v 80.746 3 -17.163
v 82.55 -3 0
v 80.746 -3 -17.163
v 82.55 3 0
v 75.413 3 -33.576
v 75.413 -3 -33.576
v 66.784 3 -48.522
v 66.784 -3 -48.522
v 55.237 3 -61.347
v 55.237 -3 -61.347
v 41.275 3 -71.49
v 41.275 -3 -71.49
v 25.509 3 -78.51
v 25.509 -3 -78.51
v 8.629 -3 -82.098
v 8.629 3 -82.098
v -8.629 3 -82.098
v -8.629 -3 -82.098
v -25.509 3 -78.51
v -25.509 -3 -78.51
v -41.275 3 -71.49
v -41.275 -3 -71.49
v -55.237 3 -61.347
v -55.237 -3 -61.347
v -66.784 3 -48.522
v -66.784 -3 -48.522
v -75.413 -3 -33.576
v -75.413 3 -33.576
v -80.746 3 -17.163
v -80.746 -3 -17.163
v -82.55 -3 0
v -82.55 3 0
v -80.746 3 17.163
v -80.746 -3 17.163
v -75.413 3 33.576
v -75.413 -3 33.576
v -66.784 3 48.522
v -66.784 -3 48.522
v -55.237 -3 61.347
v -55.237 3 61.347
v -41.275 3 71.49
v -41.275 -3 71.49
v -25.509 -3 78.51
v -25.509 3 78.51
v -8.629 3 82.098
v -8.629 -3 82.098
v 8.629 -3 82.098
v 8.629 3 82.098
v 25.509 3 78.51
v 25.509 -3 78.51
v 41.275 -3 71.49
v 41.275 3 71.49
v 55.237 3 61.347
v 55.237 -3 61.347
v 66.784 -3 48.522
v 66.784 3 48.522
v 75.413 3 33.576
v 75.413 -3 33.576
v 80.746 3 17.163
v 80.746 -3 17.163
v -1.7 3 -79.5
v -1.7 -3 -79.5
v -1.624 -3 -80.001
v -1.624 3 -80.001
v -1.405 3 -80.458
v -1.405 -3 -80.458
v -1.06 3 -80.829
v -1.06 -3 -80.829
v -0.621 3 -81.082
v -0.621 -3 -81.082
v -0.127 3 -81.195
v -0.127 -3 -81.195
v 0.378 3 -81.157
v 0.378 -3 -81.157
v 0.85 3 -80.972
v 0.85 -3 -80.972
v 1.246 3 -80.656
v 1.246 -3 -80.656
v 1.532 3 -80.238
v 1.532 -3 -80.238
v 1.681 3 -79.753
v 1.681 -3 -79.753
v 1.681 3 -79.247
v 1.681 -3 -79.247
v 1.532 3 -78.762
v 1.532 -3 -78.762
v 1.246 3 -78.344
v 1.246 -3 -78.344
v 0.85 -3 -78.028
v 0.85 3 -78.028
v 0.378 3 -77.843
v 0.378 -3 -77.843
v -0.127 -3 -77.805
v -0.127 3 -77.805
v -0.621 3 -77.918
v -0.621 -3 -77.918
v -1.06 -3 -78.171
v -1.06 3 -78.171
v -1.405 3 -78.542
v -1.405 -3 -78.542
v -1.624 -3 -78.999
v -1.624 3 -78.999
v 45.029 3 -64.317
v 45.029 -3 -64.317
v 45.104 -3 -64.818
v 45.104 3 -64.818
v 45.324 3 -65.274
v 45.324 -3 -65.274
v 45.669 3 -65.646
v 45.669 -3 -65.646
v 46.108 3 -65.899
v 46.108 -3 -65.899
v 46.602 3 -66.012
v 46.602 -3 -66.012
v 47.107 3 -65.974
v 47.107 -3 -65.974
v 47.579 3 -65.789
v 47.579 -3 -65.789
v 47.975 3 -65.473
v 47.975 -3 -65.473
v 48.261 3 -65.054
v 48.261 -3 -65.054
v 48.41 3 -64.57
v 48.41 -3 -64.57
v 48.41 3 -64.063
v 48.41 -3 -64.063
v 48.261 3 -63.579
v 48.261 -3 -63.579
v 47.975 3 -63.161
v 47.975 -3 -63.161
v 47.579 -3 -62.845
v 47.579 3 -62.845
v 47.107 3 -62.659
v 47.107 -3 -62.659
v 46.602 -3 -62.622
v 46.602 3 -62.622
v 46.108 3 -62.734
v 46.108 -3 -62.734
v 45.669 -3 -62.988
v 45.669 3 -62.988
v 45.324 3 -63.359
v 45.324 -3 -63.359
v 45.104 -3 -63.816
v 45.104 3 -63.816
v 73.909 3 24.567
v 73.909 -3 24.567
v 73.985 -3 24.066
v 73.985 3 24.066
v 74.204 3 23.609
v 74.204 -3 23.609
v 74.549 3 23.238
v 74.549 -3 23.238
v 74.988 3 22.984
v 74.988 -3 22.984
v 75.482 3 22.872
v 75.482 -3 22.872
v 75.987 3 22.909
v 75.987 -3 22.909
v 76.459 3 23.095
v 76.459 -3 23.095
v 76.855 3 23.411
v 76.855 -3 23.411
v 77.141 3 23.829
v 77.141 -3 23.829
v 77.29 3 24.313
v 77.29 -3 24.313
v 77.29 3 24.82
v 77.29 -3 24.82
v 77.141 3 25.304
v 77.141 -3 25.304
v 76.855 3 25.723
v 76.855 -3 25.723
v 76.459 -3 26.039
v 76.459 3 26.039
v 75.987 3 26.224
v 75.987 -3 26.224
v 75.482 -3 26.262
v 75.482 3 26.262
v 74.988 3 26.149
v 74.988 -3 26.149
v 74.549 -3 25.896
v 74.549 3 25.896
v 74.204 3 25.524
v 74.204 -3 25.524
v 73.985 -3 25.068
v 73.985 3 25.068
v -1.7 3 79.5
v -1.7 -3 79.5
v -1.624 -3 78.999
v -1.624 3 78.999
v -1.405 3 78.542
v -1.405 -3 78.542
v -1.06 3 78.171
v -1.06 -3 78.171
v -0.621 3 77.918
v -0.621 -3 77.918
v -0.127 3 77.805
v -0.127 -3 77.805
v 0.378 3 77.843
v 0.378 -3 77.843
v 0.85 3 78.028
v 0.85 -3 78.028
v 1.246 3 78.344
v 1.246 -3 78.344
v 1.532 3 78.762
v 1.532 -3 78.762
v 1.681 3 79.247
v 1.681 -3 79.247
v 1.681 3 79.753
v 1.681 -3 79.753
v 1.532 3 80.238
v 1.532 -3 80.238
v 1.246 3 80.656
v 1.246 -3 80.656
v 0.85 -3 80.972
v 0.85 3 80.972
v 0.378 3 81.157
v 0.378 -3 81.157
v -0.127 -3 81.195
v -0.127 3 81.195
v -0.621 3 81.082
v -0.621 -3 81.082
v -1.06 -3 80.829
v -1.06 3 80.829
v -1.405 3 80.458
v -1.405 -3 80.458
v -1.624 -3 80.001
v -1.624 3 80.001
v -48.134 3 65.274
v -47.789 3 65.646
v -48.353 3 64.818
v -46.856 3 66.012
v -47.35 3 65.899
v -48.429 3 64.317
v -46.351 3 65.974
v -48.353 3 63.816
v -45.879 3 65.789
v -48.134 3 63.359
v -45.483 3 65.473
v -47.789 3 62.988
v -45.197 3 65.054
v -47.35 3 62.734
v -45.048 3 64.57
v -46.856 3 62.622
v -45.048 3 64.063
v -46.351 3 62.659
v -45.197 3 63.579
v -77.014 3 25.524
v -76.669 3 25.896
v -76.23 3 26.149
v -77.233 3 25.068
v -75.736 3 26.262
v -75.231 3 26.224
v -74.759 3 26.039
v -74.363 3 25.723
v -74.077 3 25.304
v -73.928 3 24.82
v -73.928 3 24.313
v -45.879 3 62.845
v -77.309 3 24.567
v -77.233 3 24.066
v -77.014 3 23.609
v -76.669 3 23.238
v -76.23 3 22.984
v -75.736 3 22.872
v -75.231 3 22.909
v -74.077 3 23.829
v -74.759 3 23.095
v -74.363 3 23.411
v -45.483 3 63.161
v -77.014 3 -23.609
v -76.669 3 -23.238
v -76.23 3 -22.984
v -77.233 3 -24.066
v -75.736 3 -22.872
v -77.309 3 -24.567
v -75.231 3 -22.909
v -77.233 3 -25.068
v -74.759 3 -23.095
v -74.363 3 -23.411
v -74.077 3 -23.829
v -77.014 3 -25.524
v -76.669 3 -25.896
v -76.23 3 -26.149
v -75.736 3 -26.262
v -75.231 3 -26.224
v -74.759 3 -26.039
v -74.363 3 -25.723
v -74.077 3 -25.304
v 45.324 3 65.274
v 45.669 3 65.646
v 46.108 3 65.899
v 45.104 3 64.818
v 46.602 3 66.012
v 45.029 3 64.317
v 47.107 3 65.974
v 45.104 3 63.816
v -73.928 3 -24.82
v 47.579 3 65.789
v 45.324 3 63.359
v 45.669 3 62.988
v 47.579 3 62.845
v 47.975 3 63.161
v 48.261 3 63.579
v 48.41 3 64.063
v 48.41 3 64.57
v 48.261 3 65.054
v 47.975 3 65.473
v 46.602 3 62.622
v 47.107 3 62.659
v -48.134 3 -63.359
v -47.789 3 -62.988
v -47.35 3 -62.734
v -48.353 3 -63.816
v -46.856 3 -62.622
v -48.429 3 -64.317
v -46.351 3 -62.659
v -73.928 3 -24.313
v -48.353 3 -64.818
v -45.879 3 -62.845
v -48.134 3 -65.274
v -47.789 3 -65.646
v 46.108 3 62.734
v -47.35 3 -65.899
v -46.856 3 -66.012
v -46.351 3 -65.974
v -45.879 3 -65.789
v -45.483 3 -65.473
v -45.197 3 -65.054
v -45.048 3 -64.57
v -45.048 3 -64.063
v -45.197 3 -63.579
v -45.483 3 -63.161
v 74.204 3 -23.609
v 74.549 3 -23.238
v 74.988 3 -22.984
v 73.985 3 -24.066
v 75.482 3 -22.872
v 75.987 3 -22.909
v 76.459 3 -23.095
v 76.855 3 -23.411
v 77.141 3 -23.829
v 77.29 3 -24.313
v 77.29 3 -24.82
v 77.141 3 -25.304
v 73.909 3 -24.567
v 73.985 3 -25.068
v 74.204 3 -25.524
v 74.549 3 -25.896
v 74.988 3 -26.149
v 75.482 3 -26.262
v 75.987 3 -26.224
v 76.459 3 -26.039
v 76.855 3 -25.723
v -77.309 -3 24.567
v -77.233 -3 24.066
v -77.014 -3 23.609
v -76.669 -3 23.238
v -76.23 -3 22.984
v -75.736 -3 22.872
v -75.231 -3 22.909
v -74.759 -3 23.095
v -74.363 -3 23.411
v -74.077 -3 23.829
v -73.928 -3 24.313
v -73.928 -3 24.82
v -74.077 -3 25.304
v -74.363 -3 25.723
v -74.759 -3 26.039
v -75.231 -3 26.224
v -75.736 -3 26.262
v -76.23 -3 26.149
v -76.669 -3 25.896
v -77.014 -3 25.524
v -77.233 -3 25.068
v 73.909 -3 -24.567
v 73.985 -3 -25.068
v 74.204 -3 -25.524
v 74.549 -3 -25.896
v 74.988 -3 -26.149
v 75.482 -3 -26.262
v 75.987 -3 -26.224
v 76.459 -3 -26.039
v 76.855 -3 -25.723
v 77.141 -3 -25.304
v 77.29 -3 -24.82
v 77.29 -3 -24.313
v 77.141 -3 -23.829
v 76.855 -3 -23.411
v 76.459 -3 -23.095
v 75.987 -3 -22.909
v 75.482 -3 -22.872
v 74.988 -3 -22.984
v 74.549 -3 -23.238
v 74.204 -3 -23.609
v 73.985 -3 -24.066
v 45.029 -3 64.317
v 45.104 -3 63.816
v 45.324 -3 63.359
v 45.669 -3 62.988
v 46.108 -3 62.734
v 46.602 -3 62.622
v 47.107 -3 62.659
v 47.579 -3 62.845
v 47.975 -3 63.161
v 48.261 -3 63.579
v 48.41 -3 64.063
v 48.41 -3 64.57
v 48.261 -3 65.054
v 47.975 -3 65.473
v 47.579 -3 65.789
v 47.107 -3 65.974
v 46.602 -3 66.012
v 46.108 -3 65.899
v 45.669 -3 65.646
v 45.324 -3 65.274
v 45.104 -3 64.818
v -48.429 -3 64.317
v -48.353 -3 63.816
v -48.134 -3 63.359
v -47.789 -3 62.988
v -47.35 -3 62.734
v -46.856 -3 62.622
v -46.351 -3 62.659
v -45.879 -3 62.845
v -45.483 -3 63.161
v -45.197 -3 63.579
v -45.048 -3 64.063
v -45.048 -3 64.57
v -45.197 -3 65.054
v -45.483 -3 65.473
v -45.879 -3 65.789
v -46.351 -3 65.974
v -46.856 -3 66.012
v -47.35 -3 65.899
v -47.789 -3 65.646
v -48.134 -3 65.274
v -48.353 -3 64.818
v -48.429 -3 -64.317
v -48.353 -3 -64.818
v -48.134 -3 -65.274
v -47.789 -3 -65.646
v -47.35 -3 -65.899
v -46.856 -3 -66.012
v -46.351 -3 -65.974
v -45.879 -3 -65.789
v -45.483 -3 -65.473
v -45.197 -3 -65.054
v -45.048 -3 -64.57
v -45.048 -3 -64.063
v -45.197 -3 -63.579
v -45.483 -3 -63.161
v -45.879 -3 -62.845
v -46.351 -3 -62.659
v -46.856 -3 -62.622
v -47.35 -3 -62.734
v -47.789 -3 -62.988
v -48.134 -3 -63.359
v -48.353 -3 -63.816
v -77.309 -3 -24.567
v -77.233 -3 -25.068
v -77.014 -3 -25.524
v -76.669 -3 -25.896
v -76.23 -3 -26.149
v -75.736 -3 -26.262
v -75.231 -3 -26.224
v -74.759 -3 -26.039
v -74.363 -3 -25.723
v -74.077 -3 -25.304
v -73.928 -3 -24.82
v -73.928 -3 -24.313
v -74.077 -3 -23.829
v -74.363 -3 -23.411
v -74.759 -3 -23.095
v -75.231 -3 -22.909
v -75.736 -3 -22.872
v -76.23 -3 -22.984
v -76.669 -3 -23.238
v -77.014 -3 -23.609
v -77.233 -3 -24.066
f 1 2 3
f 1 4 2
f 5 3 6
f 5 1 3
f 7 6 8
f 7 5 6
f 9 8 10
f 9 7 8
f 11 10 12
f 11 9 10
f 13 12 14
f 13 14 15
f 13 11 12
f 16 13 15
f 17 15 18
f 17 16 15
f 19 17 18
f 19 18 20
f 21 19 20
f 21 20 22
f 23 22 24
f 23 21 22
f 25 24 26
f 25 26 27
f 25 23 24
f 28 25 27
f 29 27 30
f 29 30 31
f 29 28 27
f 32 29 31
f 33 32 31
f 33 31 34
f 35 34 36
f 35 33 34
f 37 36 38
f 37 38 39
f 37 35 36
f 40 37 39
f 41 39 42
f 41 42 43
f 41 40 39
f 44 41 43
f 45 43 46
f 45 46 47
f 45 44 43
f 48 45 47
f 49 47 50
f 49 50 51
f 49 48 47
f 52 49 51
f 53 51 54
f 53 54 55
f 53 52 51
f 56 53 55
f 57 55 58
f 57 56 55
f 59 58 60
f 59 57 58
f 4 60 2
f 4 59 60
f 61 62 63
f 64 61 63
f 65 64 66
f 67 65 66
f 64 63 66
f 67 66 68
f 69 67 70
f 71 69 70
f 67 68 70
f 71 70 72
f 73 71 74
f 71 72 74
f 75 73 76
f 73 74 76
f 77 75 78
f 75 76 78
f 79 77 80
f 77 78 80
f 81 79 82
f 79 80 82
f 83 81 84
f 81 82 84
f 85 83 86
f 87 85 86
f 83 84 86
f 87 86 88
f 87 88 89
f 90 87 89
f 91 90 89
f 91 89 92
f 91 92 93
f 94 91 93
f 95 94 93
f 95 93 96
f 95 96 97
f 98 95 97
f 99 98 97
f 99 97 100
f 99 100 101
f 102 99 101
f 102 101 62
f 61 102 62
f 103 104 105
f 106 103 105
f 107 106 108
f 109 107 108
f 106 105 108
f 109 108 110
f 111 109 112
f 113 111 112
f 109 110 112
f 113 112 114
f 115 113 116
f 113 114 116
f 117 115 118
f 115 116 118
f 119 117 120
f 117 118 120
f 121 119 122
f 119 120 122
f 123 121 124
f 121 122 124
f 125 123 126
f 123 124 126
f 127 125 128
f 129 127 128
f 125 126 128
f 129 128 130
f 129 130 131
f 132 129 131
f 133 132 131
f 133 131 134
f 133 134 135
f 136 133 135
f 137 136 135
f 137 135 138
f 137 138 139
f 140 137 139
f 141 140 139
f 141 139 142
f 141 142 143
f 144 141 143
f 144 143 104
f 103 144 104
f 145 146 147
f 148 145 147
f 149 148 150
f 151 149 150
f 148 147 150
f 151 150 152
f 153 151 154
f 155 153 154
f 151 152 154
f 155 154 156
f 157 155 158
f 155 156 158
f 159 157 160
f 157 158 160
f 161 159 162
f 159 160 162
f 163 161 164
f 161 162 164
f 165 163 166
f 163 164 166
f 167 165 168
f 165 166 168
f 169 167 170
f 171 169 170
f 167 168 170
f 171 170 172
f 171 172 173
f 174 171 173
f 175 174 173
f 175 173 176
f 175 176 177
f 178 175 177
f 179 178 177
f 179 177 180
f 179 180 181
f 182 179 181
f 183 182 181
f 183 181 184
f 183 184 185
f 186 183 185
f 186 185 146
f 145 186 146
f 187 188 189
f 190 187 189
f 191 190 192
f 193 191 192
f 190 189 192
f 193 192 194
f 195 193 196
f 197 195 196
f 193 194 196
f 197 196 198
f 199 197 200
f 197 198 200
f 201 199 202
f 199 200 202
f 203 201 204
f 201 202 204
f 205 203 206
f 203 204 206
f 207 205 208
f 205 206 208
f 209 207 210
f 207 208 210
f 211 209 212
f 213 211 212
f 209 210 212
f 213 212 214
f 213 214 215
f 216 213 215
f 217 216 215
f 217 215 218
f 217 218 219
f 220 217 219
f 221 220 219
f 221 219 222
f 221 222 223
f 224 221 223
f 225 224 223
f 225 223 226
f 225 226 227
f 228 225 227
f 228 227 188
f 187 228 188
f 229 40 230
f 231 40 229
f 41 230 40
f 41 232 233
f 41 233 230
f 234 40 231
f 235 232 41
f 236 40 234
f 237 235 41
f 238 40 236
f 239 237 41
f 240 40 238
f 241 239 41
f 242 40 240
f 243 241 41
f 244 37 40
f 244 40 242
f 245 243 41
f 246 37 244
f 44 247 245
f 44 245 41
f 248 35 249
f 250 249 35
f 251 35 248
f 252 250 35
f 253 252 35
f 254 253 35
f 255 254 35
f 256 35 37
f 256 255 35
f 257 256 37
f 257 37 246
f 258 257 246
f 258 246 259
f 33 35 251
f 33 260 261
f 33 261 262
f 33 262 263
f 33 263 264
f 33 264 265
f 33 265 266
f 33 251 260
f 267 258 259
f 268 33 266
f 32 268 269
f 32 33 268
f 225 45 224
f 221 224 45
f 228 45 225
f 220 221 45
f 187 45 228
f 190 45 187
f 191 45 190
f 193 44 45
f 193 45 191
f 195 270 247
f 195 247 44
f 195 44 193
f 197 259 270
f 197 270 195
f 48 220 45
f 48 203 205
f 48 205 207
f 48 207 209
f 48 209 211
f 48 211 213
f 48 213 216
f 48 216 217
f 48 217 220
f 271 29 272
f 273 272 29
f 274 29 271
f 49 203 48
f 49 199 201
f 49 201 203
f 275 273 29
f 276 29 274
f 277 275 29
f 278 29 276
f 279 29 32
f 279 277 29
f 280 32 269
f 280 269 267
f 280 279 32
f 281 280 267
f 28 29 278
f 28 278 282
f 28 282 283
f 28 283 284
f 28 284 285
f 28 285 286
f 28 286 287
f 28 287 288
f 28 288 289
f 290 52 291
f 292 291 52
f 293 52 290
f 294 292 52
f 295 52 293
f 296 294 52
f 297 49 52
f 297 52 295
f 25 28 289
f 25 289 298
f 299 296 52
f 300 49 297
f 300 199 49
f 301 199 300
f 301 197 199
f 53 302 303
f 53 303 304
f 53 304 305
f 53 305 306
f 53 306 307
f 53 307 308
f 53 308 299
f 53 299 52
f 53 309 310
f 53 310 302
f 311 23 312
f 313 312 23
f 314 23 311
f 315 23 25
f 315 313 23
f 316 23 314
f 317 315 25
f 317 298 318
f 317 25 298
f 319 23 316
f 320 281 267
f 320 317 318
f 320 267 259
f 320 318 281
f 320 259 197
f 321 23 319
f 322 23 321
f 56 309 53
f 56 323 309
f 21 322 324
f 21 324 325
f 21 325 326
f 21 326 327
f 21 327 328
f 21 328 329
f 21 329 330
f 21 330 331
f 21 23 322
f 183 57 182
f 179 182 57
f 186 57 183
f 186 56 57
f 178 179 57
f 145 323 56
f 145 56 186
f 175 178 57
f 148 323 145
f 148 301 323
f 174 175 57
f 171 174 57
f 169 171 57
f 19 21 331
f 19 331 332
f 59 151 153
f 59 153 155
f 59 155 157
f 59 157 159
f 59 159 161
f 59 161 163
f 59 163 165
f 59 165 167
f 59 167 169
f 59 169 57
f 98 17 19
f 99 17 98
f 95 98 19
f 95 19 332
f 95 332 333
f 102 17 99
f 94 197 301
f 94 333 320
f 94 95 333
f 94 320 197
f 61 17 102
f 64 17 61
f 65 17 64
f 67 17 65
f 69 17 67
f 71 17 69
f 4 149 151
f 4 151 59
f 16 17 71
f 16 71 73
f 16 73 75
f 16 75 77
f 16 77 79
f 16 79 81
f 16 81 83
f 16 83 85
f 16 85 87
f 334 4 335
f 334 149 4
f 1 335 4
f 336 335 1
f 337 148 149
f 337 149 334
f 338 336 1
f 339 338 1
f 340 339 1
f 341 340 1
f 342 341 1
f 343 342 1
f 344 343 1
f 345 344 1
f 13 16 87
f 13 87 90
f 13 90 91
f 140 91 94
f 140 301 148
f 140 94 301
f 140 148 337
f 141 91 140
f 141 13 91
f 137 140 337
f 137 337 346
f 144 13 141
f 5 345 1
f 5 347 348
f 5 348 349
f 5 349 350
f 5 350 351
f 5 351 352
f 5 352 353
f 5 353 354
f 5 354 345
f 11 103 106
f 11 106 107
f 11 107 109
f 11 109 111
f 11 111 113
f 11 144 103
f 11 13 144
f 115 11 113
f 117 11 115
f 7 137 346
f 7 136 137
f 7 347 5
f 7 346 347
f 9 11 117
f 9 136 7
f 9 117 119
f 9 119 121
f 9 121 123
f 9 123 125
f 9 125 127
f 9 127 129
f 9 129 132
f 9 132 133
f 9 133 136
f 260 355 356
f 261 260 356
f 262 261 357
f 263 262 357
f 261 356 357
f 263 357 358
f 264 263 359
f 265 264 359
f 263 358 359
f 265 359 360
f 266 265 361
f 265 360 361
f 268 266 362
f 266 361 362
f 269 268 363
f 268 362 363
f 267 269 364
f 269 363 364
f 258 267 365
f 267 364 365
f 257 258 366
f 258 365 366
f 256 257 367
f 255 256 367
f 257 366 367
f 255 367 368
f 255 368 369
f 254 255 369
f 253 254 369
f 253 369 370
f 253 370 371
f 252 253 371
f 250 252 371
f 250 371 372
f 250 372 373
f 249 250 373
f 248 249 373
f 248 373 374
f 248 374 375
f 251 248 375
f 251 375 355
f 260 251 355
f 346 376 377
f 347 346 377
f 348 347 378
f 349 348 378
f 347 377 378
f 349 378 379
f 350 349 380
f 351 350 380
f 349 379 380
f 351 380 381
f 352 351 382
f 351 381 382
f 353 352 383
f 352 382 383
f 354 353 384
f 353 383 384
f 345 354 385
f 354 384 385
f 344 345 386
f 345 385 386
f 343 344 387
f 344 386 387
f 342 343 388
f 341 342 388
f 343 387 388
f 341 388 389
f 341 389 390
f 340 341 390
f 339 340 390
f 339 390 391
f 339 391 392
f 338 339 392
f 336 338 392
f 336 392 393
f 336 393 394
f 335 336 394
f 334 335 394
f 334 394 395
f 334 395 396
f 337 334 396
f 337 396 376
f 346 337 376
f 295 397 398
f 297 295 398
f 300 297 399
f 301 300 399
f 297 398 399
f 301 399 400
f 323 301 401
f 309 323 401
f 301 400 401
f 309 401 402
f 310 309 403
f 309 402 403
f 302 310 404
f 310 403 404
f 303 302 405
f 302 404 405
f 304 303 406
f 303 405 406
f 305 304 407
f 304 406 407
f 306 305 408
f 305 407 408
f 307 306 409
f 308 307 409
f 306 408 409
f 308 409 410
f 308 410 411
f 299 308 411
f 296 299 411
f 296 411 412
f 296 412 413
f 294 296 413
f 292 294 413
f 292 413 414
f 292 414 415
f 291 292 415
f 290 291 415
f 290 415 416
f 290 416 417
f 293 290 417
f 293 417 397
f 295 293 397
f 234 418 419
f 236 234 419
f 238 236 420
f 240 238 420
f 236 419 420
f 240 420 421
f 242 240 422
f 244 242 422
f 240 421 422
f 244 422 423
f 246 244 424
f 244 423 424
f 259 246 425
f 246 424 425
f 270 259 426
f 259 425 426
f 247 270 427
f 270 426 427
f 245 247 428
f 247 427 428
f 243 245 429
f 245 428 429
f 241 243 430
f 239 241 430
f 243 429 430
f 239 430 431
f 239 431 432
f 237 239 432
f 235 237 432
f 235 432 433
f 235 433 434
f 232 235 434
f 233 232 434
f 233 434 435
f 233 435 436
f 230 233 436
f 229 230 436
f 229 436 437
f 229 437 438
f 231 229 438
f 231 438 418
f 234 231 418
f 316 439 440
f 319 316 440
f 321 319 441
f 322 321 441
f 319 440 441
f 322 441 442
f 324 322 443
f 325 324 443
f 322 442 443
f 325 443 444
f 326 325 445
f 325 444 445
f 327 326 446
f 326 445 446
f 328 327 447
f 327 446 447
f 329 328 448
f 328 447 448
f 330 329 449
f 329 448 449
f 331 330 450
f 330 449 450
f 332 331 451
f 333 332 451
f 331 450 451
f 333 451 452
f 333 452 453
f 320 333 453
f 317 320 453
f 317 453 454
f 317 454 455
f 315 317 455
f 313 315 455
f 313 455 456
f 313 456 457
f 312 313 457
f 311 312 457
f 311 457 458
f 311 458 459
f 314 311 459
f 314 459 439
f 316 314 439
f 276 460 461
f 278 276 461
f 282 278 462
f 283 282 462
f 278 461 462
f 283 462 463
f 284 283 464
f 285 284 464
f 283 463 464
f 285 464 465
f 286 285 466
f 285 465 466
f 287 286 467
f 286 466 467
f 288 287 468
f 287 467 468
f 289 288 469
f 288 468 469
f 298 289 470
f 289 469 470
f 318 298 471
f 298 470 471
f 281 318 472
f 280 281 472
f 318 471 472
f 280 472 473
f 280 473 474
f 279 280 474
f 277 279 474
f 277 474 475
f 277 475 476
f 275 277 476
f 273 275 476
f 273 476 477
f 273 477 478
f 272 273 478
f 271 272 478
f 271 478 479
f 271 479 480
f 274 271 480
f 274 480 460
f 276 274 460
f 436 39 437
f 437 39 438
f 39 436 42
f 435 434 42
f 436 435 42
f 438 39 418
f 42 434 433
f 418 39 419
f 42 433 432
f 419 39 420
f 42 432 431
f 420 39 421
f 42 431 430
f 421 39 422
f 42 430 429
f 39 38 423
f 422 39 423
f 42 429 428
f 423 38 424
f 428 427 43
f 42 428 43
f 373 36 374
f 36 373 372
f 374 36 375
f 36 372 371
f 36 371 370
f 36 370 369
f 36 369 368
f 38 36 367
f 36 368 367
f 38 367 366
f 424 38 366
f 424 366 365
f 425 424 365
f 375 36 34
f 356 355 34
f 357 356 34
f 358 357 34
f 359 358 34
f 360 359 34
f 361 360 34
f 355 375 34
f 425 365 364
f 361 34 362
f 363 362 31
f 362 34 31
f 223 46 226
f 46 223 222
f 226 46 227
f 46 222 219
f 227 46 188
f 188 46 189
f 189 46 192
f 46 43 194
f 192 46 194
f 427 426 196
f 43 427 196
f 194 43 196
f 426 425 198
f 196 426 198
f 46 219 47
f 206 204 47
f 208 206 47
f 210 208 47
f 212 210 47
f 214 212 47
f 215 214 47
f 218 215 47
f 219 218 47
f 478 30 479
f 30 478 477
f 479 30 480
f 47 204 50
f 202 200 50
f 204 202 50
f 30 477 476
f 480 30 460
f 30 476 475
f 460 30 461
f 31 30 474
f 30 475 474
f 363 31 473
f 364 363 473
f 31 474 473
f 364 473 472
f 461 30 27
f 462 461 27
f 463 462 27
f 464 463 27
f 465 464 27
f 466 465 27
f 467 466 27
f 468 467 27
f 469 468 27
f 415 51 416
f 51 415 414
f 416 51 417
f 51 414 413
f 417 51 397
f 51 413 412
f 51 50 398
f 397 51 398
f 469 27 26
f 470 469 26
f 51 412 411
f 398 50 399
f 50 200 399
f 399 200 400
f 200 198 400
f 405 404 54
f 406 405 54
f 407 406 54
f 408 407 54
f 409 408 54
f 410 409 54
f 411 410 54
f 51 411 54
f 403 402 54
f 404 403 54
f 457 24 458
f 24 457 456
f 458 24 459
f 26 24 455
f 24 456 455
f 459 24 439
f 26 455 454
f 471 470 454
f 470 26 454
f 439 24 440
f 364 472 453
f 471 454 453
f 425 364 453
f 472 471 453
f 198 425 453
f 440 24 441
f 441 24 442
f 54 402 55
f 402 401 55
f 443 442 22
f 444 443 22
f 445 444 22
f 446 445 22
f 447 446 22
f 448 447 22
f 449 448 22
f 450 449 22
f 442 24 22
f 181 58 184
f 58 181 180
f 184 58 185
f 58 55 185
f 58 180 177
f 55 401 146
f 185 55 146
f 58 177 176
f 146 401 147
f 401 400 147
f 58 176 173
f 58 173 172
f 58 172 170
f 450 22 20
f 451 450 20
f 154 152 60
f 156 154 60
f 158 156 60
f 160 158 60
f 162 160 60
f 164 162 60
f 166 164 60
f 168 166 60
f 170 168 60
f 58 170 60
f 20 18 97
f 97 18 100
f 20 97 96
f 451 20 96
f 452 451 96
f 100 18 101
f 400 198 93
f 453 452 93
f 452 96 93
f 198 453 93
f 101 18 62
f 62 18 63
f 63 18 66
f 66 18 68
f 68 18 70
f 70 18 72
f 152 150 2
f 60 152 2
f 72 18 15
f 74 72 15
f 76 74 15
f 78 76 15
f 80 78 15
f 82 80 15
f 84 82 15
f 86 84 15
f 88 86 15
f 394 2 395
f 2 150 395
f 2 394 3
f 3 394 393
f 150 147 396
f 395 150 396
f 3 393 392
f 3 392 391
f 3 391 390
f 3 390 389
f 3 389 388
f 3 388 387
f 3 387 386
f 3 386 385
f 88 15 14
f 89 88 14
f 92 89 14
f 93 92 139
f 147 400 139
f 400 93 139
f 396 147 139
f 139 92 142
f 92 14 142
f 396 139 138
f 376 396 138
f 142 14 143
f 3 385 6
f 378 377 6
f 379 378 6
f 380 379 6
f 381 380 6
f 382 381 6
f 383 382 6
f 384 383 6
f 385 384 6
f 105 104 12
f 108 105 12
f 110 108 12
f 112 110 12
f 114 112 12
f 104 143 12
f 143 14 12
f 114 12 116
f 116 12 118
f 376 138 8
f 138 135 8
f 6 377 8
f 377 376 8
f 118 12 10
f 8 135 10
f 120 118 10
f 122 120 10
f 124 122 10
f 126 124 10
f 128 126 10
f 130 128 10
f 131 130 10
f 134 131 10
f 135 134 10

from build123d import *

# Parameters (mm, degrees)
SKETCH1_R            = 82.55
BOSS_EXTRUDE1_DEPTH  = 3
M3_CLEARANCE_HOLE1_D = 3.4


with BuildPart() as part:
    # Sketch1 → Boss-Extrude1 (new body, symmetric)
    with BuildSketch(Plane(origin=(0, 0, 0), x_dir=(1, 0, 0), z_dir=(0, 1, 0))):
        Circle(SKETCH1_R)
    extrude(amount=BOSS_EXTRUDE1_DEPTH, both=True)

    # M3 Clearance Hole1 (through all)
    with Locations(Plane(origin=(0, 3, 0), x_dir=(1, 0, 0), z_dir=(0, 1, 0))):
        with Locations((0, 79.5), (46.728927557, 64.316851053), (75.608993045, 24.566851053), (75.608993045, -24.566851053), (46.728927557, -64.316851053), (0, -79.5), (-46.728927557, -64.316851053), (-75.608993045, -24.566851053), (-75.608993045, 24.566851053), (-46.728927557, 64.316851053)):
            Hole(M3_CLEARANCE_HOLE1_D / 2)


solid = part.part
